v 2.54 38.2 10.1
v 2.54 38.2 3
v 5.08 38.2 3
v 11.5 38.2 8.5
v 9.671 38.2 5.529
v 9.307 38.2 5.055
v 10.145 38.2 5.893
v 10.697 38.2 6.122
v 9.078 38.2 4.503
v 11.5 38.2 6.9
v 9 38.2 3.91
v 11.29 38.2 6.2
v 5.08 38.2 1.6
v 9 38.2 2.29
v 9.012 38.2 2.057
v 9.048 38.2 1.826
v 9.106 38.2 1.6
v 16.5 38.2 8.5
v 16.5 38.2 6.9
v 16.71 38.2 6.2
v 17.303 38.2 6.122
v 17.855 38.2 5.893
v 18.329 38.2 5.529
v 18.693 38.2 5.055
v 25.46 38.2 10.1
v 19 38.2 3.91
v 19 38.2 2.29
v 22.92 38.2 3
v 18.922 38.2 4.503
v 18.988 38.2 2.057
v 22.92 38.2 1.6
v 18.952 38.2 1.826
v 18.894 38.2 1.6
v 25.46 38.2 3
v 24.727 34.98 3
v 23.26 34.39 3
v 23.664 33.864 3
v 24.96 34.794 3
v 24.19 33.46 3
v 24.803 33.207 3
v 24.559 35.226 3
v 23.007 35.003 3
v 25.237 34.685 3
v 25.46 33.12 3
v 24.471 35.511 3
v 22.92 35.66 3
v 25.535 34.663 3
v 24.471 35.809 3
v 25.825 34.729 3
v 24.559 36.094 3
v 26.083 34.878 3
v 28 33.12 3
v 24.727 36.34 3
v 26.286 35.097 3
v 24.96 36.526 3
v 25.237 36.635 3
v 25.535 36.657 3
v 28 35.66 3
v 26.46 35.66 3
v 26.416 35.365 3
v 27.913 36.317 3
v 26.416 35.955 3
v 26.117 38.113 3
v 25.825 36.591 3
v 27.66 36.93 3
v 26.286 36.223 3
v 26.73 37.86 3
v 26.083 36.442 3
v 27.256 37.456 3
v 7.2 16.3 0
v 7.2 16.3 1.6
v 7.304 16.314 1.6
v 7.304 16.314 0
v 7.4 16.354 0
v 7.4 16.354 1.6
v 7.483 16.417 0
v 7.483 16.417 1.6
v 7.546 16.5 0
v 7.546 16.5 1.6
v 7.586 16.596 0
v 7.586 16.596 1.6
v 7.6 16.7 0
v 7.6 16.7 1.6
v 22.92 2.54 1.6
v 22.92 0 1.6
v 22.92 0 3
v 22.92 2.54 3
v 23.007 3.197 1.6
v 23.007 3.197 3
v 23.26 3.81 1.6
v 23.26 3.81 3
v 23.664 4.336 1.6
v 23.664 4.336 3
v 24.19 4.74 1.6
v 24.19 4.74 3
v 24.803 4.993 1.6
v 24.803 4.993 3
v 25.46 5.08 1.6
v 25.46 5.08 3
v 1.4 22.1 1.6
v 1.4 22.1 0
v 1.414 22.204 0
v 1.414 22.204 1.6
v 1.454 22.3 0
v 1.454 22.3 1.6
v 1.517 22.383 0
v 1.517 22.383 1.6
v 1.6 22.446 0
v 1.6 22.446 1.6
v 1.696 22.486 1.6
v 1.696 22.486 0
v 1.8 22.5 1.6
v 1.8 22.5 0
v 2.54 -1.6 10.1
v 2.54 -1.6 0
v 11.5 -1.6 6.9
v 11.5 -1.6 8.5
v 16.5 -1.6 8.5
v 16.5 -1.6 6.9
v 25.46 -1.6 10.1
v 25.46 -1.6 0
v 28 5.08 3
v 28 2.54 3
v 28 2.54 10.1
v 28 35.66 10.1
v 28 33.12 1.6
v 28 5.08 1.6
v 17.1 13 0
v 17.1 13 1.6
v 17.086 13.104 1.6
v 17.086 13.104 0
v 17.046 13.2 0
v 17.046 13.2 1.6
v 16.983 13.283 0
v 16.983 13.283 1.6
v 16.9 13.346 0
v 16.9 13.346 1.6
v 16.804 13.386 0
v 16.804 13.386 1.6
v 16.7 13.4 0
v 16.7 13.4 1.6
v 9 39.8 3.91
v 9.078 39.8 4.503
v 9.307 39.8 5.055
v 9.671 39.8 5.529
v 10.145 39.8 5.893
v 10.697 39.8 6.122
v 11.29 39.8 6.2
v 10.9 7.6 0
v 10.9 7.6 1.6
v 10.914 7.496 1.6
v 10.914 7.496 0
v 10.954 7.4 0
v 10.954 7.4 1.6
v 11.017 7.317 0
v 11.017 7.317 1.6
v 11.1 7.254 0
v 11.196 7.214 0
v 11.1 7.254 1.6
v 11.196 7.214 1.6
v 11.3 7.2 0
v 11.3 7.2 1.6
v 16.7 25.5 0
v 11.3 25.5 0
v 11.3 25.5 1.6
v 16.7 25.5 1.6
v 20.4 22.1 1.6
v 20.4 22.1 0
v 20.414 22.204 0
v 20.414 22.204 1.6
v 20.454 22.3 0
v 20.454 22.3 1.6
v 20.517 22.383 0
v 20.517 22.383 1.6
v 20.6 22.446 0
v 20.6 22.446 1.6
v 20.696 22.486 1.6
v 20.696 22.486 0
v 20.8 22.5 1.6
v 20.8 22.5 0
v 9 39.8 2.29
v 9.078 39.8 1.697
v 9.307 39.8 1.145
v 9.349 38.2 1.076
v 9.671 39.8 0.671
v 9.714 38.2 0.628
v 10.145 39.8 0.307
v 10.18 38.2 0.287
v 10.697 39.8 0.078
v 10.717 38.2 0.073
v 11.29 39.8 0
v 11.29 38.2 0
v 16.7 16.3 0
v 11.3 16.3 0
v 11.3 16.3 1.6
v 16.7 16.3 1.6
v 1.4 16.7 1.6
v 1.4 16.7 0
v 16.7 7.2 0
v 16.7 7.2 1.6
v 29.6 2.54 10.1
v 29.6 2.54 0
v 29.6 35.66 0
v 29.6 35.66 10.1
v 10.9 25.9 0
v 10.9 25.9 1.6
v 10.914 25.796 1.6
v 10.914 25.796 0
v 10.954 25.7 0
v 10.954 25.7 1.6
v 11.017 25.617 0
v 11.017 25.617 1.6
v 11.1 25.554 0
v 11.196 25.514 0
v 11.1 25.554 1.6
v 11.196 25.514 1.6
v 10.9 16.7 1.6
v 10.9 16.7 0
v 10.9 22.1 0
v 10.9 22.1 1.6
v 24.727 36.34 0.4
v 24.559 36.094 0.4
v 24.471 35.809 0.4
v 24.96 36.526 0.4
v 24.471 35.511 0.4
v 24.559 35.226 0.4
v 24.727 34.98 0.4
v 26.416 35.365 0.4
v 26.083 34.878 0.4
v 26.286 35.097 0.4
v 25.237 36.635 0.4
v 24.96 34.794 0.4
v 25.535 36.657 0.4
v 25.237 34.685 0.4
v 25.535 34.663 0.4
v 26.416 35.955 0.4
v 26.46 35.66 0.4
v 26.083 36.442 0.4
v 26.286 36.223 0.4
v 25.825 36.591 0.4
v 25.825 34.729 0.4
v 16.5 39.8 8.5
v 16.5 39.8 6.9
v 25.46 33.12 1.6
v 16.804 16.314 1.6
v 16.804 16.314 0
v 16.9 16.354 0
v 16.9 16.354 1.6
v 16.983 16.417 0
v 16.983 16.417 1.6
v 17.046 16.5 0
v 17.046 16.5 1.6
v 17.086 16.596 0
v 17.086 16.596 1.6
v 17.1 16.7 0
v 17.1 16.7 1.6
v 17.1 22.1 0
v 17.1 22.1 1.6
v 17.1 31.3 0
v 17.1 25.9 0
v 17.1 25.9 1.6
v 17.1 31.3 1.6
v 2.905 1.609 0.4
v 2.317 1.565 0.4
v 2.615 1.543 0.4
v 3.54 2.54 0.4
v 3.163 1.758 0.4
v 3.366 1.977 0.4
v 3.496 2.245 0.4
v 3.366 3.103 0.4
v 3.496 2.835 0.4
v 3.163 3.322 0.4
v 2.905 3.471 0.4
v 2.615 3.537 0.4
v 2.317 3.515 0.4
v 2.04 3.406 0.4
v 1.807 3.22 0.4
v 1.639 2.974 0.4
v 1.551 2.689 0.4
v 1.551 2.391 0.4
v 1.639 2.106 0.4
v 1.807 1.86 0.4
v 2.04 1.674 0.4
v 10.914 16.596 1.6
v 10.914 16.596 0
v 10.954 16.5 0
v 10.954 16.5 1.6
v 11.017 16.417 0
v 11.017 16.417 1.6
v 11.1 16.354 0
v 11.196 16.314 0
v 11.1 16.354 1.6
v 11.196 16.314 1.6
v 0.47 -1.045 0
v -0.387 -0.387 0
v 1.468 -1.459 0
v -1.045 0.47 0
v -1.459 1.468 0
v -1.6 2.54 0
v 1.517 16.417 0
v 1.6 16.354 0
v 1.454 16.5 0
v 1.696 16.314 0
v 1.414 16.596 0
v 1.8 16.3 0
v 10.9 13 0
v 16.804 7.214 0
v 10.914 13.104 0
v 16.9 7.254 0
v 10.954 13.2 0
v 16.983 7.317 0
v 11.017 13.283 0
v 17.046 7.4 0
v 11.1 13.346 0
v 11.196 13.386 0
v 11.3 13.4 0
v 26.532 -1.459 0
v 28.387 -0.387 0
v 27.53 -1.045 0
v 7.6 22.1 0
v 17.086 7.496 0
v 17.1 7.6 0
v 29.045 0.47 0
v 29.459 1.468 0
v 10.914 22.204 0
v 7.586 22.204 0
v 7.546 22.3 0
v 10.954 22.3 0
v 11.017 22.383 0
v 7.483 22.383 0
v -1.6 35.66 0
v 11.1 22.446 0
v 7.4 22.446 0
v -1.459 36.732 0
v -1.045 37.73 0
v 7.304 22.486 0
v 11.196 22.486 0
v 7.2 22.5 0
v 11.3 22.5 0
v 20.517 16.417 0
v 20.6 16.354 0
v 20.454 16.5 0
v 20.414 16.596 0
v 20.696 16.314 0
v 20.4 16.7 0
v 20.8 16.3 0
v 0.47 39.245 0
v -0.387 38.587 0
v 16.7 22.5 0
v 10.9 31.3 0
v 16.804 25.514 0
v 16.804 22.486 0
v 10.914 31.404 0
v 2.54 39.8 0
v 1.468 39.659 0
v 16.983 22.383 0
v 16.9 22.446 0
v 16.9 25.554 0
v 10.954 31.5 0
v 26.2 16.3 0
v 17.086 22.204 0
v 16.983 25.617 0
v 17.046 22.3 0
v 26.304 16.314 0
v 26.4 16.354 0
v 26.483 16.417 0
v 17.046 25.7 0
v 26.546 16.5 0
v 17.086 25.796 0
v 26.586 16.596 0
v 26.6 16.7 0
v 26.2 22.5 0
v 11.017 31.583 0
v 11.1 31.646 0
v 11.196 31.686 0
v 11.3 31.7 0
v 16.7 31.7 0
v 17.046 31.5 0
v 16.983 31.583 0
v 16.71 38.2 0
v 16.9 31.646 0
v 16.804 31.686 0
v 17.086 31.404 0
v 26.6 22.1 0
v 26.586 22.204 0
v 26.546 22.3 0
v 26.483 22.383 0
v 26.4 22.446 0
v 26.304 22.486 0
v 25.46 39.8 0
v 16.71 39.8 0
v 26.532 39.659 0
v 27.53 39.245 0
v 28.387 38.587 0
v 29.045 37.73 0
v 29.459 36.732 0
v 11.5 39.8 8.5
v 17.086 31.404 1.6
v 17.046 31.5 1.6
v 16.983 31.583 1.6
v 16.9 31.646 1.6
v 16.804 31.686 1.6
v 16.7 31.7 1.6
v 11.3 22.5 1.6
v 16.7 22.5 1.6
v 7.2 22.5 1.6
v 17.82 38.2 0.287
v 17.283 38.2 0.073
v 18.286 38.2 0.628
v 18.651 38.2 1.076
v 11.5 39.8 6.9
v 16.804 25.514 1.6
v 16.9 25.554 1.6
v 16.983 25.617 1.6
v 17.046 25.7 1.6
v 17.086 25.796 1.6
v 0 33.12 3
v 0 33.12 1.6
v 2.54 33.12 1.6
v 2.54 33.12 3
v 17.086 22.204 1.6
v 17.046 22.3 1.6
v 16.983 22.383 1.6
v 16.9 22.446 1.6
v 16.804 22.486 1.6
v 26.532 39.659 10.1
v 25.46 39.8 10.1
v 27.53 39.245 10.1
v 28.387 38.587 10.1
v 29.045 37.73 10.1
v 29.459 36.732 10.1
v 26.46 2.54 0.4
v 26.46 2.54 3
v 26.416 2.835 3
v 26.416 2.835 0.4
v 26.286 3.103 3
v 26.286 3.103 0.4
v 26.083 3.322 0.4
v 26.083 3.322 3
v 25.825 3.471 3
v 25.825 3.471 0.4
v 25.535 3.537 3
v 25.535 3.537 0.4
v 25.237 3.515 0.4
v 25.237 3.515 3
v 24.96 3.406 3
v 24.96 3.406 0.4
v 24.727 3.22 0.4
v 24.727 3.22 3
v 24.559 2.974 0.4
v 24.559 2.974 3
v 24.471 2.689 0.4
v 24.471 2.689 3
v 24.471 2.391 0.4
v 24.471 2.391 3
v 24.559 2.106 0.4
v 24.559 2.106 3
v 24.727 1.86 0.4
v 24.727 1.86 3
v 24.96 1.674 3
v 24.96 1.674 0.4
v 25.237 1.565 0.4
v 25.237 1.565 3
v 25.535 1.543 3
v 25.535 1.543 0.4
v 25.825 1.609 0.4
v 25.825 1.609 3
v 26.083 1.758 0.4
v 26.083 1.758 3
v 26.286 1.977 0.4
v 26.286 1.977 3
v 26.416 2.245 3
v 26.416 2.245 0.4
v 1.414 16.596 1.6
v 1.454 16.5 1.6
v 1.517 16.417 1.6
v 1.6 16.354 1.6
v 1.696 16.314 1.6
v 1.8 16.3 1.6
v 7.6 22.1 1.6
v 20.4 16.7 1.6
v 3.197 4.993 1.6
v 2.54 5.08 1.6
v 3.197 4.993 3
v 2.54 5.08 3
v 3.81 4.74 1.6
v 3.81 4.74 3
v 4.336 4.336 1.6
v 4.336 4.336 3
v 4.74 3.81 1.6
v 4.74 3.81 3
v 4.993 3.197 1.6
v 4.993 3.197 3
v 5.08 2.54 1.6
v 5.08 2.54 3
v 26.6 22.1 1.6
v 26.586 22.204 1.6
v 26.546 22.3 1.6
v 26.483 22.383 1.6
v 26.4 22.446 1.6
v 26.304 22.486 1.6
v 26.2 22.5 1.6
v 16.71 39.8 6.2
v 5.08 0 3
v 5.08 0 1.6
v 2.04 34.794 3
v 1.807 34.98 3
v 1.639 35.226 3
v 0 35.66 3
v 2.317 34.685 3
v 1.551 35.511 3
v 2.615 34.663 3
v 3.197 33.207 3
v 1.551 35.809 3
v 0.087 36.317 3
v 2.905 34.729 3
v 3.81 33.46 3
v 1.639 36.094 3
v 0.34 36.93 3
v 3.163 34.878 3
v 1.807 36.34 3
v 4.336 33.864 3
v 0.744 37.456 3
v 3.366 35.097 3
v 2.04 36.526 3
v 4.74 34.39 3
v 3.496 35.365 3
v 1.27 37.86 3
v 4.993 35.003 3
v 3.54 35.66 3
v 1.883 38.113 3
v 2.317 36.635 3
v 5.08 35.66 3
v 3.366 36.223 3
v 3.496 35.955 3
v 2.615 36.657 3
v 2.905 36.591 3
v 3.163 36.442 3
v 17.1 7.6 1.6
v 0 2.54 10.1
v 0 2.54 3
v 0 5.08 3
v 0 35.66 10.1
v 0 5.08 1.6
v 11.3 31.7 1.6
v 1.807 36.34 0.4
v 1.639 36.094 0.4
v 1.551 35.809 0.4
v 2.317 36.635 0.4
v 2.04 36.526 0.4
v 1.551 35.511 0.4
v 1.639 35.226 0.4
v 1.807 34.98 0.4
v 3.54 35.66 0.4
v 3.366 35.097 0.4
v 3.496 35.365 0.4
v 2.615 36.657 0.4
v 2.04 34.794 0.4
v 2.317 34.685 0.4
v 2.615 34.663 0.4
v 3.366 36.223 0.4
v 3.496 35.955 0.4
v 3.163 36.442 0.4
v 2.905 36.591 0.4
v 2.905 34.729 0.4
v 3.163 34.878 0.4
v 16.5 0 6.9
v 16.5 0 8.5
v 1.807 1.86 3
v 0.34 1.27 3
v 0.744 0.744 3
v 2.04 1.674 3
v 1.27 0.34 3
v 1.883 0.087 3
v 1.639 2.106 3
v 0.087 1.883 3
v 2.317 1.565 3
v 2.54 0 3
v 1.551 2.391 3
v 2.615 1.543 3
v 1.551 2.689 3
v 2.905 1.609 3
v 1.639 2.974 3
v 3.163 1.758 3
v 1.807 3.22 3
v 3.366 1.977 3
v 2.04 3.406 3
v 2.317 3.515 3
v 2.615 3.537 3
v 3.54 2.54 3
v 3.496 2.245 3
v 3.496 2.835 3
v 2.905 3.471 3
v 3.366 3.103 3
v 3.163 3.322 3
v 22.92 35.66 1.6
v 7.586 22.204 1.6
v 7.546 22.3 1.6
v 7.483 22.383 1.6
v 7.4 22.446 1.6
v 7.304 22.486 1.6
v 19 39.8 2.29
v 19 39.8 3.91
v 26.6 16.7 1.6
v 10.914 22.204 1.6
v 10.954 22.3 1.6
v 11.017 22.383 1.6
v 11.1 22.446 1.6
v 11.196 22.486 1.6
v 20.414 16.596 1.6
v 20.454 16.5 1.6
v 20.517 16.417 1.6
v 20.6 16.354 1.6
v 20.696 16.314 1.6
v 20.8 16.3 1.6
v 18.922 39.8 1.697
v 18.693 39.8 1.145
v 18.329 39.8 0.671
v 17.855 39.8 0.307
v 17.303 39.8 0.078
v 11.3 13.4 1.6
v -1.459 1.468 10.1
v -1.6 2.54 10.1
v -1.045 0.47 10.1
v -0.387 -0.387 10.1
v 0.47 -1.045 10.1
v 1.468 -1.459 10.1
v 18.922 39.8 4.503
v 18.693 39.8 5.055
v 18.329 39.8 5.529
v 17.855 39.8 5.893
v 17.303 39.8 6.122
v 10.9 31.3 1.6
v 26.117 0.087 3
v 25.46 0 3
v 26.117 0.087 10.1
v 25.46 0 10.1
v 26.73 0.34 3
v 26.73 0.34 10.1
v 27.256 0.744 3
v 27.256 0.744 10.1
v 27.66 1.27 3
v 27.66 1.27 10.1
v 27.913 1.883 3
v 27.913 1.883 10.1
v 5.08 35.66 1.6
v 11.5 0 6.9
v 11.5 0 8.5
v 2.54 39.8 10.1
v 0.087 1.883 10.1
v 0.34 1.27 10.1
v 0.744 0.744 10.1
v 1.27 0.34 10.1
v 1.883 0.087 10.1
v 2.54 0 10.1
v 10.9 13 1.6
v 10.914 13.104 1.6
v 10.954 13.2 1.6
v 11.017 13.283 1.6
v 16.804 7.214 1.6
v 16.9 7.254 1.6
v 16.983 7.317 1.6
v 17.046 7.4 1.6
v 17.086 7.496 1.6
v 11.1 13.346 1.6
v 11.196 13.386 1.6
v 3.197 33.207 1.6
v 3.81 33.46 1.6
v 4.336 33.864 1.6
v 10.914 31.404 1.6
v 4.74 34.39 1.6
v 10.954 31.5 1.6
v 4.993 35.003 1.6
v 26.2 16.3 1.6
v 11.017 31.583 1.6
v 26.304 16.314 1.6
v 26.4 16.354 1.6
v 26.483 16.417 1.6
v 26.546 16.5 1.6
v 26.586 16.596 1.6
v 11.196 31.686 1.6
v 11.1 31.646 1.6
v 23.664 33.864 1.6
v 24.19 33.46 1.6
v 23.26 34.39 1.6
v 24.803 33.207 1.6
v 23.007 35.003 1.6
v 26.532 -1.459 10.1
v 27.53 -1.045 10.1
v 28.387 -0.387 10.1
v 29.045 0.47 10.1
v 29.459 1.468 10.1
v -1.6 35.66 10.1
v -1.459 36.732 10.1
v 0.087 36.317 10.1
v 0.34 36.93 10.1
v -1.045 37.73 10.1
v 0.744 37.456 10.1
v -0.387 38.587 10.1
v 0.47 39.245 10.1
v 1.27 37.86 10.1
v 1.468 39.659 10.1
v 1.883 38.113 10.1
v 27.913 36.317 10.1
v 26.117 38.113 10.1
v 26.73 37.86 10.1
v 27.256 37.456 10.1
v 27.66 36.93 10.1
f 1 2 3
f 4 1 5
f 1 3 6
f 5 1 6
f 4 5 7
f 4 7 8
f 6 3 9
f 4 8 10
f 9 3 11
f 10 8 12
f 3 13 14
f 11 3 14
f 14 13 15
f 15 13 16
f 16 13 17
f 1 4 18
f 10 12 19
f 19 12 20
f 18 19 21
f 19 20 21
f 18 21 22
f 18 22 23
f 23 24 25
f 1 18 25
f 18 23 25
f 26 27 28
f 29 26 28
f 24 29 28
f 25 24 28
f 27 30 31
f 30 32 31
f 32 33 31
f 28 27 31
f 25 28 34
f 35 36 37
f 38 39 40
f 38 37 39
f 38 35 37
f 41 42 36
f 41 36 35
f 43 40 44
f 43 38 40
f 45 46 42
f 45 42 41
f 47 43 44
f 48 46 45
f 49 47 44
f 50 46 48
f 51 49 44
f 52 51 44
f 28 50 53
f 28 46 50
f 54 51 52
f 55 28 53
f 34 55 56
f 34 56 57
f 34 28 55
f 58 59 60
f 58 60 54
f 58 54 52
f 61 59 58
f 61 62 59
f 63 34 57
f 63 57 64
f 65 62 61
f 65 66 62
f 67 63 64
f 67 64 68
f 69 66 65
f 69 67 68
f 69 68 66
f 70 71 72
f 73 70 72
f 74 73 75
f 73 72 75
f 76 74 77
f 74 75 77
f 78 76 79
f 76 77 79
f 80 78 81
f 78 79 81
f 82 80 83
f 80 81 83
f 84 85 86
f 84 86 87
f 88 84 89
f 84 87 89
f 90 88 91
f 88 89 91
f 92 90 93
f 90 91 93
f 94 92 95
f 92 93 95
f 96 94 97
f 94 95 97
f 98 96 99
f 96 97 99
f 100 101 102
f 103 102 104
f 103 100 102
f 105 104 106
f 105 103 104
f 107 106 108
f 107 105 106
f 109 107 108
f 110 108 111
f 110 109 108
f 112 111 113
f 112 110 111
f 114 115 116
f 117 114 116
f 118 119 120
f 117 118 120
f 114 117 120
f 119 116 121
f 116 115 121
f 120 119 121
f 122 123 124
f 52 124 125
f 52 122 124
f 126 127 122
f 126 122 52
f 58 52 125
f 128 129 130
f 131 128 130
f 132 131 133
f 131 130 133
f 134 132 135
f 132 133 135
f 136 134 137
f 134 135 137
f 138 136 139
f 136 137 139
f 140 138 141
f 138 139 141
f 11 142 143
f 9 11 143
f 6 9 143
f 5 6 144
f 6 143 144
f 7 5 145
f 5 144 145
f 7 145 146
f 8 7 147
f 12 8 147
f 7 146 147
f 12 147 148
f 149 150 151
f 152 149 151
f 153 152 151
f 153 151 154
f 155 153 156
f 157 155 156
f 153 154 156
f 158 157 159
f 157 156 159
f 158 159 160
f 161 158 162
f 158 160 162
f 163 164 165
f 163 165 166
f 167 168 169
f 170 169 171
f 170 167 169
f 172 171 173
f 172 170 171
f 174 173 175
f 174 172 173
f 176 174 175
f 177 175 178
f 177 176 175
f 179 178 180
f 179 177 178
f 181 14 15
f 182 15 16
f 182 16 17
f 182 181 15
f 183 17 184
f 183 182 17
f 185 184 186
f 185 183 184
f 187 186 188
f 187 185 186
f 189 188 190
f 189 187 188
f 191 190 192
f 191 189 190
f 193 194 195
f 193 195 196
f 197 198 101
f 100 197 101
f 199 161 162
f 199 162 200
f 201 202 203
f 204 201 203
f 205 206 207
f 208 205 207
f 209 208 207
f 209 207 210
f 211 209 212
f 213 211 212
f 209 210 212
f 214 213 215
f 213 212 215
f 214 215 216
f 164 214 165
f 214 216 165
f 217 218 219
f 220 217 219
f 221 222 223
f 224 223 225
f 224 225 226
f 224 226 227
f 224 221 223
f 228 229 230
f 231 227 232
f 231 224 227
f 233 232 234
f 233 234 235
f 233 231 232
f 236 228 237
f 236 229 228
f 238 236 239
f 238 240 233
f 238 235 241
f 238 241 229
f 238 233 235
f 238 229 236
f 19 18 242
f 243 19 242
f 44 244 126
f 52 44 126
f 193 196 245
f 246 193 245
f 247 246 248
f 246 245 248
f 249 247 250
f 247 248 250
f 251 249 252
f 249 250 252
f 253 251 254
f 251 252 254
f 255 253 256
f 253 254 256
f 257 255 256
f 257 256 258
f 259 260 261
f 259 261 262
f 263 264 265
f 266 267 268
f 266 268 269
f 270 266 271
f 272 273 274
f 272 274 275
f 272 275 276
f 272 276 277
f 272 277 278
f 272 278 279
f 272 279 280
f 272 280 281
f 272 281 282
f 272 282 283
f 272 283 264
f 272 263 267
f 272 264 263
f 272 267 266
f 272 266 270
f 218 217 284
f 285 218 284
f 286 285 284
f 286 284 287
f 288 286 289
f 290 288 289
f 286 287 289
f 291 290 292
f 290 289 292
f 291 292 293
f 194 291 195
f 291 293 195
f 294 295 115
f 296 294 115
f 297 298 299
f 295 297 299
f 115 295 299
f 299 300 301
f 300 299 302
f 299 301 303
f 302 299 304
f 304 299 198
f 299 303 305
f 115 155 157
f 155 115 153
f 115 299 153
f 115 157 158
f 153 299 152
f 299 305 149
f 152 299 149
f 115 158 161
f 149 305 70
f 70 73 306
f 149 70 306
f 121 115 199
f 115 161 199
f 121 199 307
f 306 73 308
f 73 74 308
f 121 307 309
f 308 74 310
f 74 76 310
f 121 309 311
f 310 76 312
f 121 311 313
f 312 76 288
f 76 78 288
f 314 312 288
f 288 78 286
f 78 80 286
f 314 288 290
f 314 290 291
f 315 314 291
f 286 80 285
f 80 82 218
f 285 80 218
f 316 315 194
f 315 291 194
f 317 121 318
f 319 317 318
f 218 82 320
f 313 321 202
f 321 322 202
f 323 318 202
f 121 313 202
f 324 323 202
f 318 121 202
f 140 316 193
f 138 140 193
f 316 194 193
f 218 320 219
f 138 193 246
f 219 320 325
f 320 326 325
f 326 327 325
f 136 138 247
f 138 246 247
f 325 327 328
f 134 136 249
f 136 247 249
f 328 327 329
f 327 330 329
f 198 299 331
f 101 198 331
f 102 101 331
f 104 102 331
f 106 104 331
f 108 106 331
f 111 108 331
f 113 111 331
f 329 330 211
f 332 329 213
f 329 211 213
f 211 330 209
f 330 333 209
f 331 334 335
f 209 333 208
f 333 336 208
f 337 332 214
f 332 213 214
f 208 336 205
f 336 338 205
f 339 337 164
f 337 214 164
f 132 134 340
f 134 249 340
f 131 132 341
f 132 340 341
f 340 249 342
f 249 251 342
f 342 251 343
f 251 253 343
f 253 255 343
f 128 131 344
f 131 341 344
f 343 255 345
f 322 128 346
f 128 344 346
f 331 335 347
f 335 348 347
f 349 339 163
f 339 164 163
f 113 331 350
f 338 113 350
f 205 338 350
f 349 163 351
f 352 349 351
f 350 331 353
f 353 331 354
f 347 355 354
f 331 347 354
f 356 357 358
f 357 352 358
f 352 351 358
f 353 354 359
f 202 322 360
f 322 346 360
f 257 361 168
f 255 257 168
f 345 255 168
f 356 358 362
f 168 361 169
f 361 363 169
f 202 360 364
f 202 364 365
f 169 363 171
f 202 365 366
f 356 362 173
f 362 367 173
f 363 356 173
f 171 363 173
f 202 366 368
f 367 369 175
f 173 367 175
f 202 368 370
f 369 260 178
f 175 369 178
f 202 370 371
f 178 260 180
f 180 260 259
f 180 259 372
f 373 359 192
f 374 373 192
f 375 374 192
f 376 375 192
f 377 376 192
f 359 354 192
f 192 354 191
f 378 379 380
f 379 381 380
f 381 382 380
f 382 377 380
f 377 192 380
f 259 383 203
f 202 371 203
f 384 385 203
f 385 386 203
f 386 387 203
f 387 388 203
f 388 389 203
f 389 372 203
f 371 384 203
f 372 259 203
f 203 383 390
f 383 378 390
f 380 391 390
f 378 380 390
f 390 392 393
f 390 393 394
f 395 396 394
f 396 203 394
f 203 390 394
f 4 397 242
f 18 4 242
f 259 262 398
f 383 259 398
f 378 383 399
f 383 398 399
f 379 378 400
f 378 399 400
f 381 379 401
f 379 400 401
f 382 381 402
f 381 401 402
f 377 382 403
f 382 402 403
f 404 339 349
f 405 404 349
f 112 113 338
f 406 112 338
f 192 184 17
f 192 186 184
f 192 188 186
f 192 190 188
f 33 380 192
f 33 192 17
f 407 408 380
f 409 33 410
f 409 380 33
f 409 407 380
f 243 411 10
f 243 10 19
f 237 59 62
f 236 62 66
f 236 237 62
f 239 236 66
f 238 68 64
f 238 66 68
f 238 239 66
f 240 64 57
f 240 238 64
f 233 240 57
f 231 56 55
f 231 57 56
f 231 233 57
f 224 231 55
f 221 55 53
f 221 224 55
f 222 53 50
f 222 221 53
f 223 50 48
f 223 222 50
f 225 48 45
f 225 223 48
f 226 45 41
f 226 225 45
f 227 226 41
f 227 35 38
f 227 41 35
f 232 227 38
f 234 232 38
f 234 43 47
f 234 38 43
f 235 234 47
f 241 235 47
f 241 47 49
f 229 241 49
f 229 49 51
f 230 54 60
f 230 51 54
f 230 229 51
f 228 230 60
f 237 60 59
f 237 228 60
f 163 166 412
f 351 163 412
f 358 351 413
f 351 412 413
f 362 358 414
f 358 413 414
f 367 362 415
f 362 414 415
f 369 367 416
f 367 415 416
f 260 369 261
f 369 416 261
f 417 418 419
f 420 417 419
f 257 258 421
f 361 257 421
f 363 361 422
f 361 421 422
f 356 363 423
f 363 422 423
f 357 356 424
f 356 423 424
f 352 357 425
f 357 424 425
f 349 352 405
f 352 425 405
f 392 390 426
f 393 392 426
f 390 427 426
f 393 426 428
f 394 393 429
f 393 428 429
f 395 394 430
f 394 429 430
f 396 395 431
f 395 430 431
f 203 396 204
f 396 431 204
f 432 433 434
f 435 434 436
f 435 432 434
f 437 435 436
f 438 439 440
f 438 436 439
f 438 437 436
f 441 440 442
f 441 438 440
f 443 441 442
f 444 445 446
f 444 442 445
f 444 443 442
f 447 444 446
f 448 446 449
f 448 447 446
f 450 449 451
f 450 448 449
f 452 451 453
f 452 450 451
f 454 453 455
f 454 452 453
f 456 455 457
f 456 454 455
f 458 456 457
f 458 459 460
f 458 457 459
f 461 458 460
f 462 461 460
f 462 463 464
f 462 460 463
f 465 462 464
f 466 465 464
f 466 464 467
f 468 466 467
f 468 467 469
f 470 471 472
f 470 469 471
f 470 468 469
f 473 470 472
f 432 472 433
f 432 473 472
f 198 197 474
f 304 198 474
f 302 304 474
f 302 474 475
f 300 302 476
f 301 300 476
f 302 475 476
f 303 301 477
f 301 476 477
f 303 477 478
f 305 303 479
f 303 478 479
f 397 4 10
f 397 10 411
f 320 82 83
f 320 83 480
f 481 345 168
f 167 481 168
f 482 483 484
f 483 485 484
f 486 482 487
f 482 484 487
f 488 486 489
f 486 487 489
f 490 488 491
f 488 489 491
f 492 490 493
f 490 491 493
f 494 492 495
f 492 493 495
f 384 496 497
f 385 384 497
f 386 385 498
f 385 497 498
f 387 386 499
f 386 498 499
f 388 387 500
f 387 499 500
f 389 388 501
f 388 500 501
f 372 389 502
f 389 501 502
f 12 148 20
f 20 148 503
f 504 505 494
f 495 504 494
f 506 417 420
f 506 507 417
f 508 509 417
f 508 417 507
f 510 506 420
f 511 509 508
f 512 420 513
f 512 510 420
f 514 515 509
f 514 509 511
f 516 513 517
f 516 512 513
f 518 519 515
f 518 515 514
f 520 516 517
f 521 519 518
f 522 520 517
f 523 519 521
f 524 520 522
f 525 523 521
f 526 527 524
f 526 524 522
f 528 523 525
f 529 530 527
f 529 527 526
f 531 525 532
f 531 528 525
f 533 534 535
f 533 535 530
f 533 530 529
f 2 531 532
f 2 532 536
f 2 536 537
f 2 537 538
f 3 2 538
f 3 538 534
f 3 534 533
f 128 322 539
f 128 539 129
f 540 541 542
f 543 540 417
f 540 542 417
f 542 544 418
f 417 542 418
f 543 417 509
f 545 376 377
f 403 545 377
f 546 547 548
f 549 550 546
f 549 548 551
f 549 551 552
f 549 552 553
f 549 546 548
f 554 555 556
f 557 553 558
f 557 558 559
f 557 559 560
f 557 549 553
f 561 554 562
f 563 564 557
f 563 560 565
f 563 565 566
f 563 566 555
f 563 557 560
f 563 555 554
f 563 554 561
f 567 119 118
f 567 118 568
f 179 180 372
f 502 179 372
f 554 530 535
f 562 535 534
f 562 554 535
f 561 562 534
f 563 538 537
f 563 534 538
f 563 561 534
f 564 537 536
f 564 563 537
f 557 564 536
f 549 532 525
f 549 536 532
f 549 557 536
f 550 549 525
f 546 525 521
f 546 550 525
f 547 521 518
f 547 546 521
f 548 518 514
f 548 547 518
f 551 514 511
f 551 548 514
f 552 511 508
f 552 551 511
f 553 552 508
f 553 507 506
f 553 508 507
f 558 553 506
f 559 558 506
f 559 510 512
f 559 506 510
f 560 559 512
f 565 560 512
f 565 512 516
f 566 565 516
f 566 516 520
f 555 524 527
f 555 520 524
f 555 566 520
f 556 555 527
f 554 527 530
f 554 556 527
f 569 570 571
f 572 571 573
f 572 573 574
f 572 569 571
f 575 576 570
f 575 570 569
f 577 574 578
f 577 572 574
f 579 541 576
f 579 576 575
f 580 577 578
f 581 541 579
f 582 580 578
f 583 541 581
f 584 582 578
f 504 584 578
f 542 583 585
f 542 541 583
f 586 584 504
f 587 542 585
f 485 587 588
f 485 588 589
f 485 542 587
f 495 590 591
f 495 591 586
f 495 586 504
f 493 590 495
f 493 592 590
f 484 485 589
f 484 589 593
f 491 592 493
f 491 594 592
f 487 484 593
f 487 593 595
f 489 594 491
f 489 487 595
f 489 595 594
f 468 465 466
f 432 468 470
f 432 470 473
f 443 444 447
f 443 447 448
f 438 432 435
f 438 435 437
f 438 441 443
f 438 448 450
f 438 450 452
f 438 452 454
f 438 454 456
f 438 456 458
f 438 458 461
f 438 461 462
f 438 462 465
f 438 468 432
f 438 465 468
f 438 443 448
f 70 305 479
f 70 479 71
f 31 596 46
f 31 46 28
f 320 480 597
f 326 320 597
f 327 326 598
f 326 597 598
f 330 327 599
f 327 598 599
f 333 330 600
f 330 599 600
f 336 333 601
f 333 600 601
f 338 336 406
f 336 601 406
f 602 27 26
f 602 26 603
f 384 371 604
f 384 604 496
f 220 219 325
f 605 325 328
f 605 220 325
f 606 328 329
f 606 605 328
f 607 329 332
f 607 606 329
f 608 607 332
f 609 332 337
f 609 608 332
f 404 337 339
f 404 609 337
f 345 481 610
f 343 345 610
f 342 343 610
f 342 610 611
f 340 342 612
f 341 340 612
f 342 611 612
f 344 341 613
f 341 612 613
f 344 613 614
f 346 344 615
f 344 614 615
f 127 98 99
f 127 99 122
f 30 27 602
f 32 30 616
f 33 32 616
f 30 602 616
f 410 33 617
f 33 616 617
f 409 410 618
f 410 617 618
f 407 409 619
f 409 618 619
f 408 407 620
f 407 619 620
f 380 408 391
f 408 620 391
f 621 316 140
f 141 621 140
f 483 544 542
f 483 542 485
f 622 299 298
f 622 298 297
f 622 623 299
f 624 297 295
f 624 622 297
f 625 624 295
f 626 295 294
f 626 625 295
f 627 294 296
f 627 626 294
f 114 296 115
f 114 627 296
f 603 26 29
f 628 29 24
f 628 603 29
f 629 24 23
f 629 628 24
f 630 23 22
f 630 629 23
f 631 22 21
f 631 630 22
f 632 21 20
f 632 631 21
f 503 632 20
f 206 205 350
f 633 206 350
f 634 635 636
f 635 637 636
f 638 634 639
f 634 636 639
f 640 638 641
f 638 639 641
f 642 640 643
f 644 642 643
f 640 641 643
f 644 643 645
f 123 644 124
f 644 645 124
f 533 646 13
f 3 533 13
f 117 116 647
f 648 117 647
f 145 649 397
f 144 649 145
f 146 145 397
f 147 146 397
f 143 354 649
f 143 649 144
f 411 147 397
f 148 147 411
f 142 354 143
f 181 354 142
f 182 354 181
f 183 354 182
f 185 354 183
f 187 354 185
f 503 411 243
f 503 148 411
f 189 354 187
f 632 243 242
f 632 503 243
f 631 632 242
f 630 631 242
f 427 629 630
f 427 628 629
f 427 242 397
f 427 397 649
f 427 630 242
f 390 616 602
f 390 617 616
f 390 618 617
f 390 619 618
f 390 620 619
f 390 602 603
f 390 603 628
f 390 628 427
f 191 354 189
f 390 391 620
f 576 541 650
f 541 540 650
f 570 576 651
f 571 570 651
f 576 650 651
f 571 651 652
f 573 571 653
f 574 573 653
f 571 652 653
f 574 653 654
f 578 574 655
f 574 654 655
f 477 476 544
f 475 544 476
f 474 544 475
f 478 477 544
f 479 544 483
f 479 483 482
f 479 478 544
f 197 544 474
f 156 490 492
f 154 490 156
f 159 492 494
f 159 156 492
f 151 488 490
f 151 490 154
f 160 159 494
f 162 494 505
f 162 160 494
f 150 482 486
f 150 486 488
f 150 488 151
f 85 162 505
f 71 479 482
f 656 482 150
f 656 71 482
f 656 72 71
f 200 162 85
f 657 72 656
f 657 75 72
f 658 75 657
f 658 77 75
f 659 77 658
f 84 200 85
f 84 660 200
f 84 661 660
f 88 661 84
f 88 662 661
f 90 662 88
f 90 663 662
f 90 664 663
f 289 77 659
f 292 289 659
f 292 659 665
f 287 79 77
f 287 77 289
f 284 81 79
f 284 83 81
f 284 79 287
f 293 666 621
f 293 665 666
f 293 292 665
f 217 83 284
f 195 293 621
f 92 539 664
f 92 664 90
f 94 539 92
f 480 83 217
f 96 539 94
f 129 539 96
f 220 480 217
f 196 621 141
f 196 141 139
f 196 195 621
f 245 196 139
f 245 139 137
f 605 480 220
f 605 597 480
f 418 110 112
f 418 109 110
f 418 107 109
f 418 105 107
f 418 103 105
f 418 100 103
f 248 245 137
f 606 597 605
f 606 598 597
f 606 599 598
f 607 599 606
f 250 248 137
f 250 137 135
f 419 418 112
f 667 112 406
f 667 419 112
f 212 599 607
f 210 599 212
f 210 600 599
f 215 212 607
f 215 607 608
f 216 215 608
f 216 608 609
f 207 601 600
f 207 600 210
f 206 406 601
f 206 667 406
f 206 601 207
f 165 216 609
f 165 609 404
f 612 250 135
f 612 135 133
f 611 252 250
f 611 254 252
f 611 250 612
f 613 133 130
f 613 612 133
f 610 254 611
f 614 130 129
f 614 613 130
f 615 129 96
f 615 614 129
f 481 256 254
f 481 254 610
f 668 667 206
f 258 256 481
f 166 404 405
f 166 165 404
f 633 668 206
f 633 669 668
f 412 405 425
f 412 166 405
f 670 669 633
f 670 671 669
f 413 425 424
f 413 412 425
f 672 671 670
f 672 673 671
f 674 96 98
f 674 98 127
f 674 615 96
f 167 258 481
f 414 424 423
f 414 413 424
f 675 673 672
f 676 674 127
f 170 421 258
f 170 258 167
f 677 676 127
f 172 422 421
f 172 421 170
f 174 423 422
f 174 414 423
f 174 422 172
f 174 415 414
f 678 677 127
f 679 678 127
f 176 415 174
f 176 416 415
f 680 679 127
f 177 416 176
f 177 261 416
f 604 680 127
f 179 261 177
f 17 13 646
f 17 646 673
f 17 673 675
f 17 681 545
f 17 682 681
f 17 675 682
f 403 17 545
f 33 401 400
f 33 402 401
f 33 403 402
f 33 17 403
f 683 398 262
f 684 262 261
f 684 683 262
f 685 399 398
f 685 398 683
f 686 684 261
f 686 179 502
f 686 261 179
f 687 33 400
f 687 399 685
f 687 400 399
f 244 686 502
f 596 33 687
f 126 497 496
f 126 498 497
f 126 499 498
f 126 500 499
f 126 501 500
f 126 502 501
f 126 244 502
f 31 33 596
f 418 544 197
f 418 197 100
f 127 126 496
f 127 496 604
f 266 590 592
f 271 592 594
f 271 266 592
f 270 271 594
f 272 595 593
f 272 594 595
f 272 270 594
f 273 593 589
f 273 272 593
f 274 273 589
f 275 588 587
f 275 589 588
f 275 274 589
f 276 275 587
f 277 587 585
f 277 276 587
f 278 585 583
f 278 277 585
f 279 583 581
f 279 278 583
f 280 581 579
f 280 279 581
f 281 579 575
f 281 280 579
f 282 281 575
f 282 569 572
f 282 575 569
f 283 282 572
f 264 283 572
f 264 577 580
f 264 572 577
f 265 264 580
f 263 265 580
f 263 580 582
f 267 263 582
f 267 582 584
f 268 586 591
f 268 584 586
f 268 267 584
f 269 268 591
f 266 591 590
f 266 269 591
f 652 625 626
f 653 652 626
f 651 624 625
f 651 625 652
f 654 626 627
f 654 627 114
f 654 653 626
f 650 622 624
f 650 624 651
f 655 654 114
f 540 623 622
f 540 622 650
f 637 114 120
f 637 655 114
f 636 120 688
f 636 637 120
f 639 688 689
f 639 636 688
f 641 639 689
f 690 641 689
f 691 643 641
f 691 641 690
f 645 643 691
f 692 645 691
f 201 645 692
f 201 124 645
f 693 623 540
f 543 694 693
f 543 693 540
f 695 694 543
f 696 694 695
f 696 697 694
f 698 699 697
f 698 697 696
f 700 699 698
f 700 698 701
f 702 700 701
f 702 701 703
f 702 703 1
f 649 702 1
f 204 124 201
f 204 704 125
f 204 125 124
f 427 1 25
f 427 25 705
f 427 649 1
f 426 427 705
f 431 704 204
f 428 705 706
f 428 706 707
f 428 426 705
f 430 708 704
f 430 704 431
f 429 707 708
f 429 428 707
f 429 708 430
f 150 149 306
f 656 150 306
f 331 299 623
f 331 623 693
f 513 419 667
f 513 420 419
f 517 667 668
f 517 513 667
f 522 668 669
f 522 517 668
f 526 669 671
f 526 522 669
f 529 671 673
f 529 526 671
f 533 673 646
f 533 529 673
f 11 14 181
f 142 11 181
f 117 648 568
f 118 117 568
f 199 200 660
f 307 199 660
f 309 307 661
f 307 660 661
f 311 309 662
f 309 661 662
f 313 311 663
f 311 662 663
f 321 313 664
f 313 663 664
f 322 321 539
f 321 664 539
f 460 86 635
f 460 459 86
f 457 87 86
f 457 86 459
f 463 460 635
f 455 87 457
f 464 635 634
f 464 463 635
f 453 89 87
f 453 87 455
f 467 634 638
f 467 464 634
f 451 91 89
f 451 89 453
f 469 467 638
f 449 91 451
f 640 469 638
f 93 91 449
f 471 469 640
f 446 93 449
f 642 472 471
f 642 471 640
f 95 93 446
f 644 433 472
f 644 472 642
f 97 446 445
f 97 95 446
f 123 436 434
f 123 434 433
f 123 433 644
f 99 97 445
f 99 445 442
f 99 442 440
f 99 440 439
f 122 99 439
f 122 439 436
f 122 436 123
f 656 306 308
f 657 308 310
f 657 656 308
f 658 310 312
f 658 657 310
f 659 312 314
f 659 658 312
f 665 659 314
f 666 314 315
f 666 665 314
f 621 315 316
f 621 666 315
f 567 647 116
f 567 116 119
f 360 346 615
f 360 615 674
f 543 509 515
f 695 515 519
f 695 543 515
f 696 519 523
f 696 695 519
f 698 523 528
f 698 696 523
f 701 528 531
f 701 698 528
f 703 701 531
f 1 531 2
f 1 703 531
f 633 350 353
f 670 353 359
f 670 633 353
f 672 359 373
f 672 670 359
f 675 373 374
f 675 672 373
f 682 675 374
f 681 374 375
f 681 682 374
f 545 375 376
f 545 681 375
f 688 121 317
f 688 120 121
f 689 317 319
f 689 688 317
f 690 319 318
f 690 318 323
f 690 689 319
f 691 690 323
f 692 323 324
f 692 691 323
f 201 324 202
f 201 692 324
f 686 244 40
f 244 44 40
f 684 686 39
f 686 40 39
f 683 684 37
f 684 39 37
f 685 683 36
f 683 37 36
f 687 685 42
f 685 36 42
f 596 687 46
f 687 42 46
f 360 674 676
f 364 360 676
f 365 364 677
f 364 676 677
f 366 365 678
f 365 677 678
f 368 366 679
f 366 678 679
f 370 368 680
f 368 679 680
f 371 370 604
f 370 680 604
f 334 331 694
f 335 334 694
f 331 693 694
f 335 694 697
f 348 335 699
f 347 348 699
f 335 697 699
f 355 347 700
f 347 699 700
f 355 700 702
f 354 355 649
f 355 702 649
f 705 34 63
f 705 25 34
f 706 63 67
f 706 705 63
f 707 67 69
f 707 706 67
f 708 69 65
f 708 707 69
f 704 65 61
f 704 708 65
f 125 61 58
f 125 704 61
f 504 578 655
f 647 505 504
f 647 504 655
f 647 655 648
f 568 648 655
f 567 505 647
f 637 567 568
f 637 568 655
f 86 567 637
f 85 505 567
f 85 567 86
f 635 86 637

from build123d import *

# Parameters (mm, degrees)
BOX011_W          = 10
BOX011_H          = 3.2
BOX011_DEPTH      = 6.2
FILLET008_R       = 2.29
BOX013_W          = 5
BOX013_H          = 1.6
BOX013_DEPTH      = 1.6
BOX012_W          = 5
BOX012_H          = 1.6
BOX012_DEPTH      = 1.6
BOX009_W          = 6.2
BOX009_H          = 6.2
BOX009_DEPTH      = 2
FILLET004_R       = 0.4
BOX007_W          = 6.2
BOX007_H          = 6.2
BOX007_DEPTH      = 2
FILLET005_R       = 0.4
BOX010_W          = 6.2
BOX010_H          = 6.2
BOX010_DEPTH      = 2
FILLET006_R       = 0.4
BOX006_W          = 6.2
BOX006_H          = 6.2
BOX006_DEPTH      = 2
FILLET007_R       = 0.4
BOX008_W          = 6.2
BOX008_H          = 6.2
BOX008_DEPTH      = 2
FILLET003_R       = 0.4
CYLINDER003_R     = 1
CYLINDER003_DEPTH = 10
CYLINDER002_R     = 1
CYLINDER002_DEPTH = 10
CYLINDER001_R     = 1
CYLINDER001_DEPTH = 10
CYLINDER_R        = 1
CYLINDER_DEPTH    = 10
BOX002_W          = 5.08
BOX002_H          = 5.08
BOX002_DEPTH      = 3
BOX003_W          = 5.08
BOX003_H          = 5.08
BOX003_DEPTH      = 3
BOX004_W          = 5.08
BOX004_H          = 5.08
BOX004_DEPTH      = 3
BOX005_W          = 5.08
BOX005_H          = 5.08
BOX005_DEPTH      = 3
BOX001_W          = 28
BOX001_H          = 38.2
BOX001_DEPTH      = 10
BOX_W             = 31.2
BOX_H             = 41.4
BOX_DEPTH         = 10.1
FILLET_R          = 2.54
FILLET001_R       = 2.54
FILLET002_R       = 4.14


with BuildPart() as led:
    # Box011 → Box011 (new body)
    with BuildSketch(Plane(origin=(9, 38.2, 0), x_dir=(1, 0, 0), z_dir=(0, 0, 1))):
        with Locations((5, 1.6)):
            Rectangle(BOX011_W, BOX011_H)
    extrude(amount=BOX011_DEPTH)

    # Fillet008
    fillet008_edges = [led.edges().sort_by_distance(p)[0] for p in [
        (9, 39.8, 6.2),
        (9, 39.8, 0),
        (19, 39.8, 6.2),
        (19, 39.8, 0),
    ]]
    fillet(fillet008_edges, radius=FILLET008_R)


with BuildPart() as w_rfel013:
    # Box013 → Box013 (new body)
    with BuildSketch(Plane(origin=(11.5, 38.2, 6.9), x_dir=(1, 0, 0), z_dir=(0, 0, 1))):
        with Locations((2.5, 0.8)):
            Rectangle(BOX013_W, BOX013_H)
    extrude(amount=BOX013_DEPTH)


with BuildPart() as nut:
    # Box012 → Box012 (new body)
    with BuildSketch(Plane(origin=(11.5, -1.6, 6.9), x_dir=(1, 0, 0), z_dir=(0, 0, 1))):
        with Locations((2.5, 0.8)):
            Rectangle(BOX012_W, BOX012_H)
    extrude(amount=BOX012_DEPTH)

    # Fusion003: union Würfel013
    add(w_rfel013.part)


with BuildPart() as fillet004:
    # Box009 → Box009 (new body)
    with BuildSketch(Plane(origin=(1.4, 16.3, 0), x_dir=(1, 0, 0), z_dir=(0, 0, 1))):
        with Locations((3.1, 3.1)):
            Rectangle(BOX009_W, BOX009_H)
    extrude(amount=BOX009_DEPTH)

    # Fillet004
    fillet004_edges = [fillet004.edges().sort_by_distance(p)[0] for p in [
        (1.4, 16.3, 1),
        (1.4, 22.5, 1),
        (7.6, 16.3, 1),
        (7.6, 22.5, 1),
    ]]
    fillet(fillet004_edges, radius=FILLET004_R)


with BuildPart() as fillet005:
    # Box007 → Box007 (new body)
    with BuildSketch(Plane(origin=(10.9, 16.3, 0), x_dir=(1, 0, 0), z_dir=(0, 0, 1))):
        with Locations((3.1, 3.1)):
            Rectangle(BOX007_W, BOX007_H)
    extrude(amount=BOX007_DEPTH)

    # Fillet005
    fillet005_edges = [fillet005.edges().sort_by_distance(p)[0] for p in [
        (10.9, 16.3, 1),
        (10.9, 22.5, 1),
        (17.1, 16.3, 1),
        (17.1, 22.5, 1),
    ]]
    fillet(fillet005_edges, radius=FILLET005_R)


with BuildPart() as fillet006:
    # Box010 → Box010 (new body)
    with BuildSketch(Plane(origin=(20.4, 16.3, 0), x_dir=(1, 0, 0), z_dir=(0, 0, 1))):
        with Locations((3.1, 3.1)):
            Rectangle(BOX010_W, BOX010_H)
    extrude(amount=BOX010_DEPTH)

    # Fillet006
    fillet006_edges = [fillet006.edges().sort_by_distance(p)[0] for p in [
        (20.4, 16.3, 1),
        (20.4, 22.5, 1),
        (26.6, 16.3, 1),
        (26.6, 22.5, 1),
    ]]
    fillet(fillet006_edges, radius=FILLET006_R)


with BuildPart() as fillet007:
    # Box006 → Box006 (new body)
    with BuildSketch(Plane(origin=(10.9, 7.2, 0), x_dir=(1, 0, 0), z_dir=(0, 0, 1))):
        with Locations((3.1, 3.1)):
            Rectangle(BOX006_W, BOX006_H)
    extrude(amount=BOX006_DEPTH)

    # Fillet007
    fillet007_edges = [fillet007.edges().sort_by_distance(p)[0] for p in [
        (10.9, 7.2, 1),
        (10.9, 13.4, 1),
        (17.1, 7.2, 1),
        (17.1, 13.4, 1),
    ]]
    fillet(fillet007_edges, radius=FILLET007_R)


with BuildPart() as buttons:
    # Box008 → Box008 (new body)
    with BuildSketch(Plane(origin=(10.9, 25.5, 0), x_dir=(1, 0, 0), z_dir=(0, 0, 1))):
        with Locations((3.1, 3.1)):
            Rectangle(BOX008_W, BOX008_H)
    extrude(amount=BOX008_DEPTH)

    # Fillet003
    fillet003_edges = [buttons.edges().sort_by_distance(p)[0] for p in [
        (10.9, 25.5, 1),
        (10.9, 31.7, 1),
        (17.1, 25.5, 1),
        (17.1, 31.7, 1),
    ]]
    fillet(fillet003_edges, radius=FILLET003_R)

    # Fusion002: union Fillet004, Fillet005, Fillet006, Fillet007
    add(fillet004.part)
    add(fillet005.part)
    add(fillet006.part)
    add(fillet007.part)


with BuildPart() as zylinder003:
    # Cylinder003 → Cylinder003 (new body)
    with BuildSketch(Plane(origin=(25.46, 35.66, 0.4), x_dir=(1, 0, 0), z_dir=(0, 0, 1))):
        Circle(CYLINDER003_R)
    extrude(amount=CYLINDER003_DEPTH)


with BuildPart() as zylinder002:
    # Cylinder002 → Cylinder002 (new body)
    with BuildSketch(Plane(origin=(2.54, 35.66, 0.4), x_dir=(1, 0, 0), z_dir=(0, 0, 1))):
        Circle(CYLINDER002_R)
    extrude(amount=CYLINDER002_DEPTH)


with BuildPart() as zylinder001:
    # Cylinder001 → Cylinder001 (new body)
    with BuildSketch(Plane(origin=(25.46, 2.54, 0.4), x_dir=(1, 0, 0), z_dir=(0, 0, 1))):
        Circle(CYLINDER001_R)
    extrude(amount=CYLINDER001_DEPTH)


with BuildPart() as fusion001:
    # Cylinder → Cylinder (new body)
    with BuildSketch(Plane(origin=(2.54, 2.54, 0.4), x_dir=(1, 0, 0), z_dir=(0, 0, 1))):
        Circle(CYLINDER_R)
    extrude(amount=CYLINDER_DEPTH)

    # Fusion001: union Zylinder003, Zylinder002, Zylinder001
    add(zylinder003.part)
    add(zylinder002.part)
    add(zylinder001.part)


with BuildPart() as w_rfel002:
    # Box002 → Box002 (new body)
    with BuildSketch(Plane.XY):
        with Locations((2.54, 2.54)):
            Rectangle(BOX002_W, BOX002_H)
    extrude(amount=BOX002_DEPTH)


with BuildPart() as w_rfel003:
    # Box003 → Box003 (new body)
    with BuildSketch(Plane(origin=(22.92, 0, 0), x_dir=(1, 0, 0), z_dir=(0, 0, 1))):
        with Locations((2.54, 2.54)):
            Rectangle(BOX003_W, BOX003_H)
    extrude(amount=BOX003_DEPTH)


with BuildPart() as w_rfel004:
    # Box004 → Box004 (new body)
    with BuildSketch(Plane(origin=(0, 33.12, 0), x_dir=(1, 0, 0), z_dir=(0, 0, 1))):
        with Locations((2.54, 2.54)):
            Rectangle(BOX004_W, BOX004_H)
    extrude(amount=BOX004_DEPTH)


with BuildPart() as w_rfel005:
    # Box005 → Box005 (new body)
    with BuildSketch(Plane(origin=(22.92, 33.12, 0), x_dir=(1, 0, 0), z_dir=(0, 0, 1))):
        with Locations((2.54, 2.54)):
            Rectangle(BOX005_W, BOX005_H)
    extrude(amount=BOX005_DEPTH)


with BuildPart() as w_rfel001:
    # Box001 → Box001 (new body)
    with BuildSketch(Plane.XY.offset(1.6)):
        with Locations((14, 19.1)):
            Rectangle(BOX001_W, BOX001_H)
    extrude(amount=BOX001_DEPTH)


with BuildPart() as cut005:
    # Box → Box (new body)
    with BuildSketch(Plane(origin=(-1.6, -1.6, 0), x_dir=(1, 0, 0), z_dir=(0, 0, 1))):
        with Locations((15.6, 20.7)):
            Rectangle(BOX_W, BOX_H)
    extrude(amount=BOX_DEPTH)

    # Cut: cut Würfel001
    add(w_rfel001.part, mode=Mode.SUBTRACT)

    # Fusion: union Würfel002, Würfel003, Würfel004, Würfel005
    add(w_rfel002.part)
    add(w_rfel003.part)
    add(w_rfel004.part)
    add(w_rfel005.part)

    # Fillet
    fillet_edges = [cut005.edges().sort_by_distance(p)[0] for p in [
        (22.92, 33.12, 2.3),
        (22.92, 5.08, 2.3),
        (5.08, 33.12, 2.3),
        (5.08, 5.08, 2.3),
    ]]
    fillet(fillet_edges, radius=FILLET_R)

    # Fillet001
    fillet001_edges = [cut005.edges().sort_by_distance(p)[0] for p in [
        (28, 38.2, 6.55),
        (0, 38.2, 6.55),
        (28, 0, 6.55),
        (0, 0, 6.55),
    ]]
    fillet(fillet001_edges, radius=FILLET001_R)

    # Fillet002
    fillet002_edges = [cut005.edges().sort_by_distance(p)[0] for p in [
        (-1.6, -1.6, 5.05),
        (-1.6, 39.8, 5.05),
        (29.6, 39.8, 5.05),
        (29.6, -1.6, 5.05),
    ]]
    fillet(fillet002_edges, radius=FILLET002_R)

    # Cut001: cut Fusion001
    add(fusion001.part, mode=Mode.SUBTRACT)

    # Cut003: cut Buttons
    add(buttons.part, mode=Mode.SUBTRACT)

    # Cut004: cut Nut
    add(nut.part, mode=Mode.SUBTRACT)

    # Cut005: cut LED
    add(led.part, mode=Mode.SUBTRACT)


solid = cut005.part
